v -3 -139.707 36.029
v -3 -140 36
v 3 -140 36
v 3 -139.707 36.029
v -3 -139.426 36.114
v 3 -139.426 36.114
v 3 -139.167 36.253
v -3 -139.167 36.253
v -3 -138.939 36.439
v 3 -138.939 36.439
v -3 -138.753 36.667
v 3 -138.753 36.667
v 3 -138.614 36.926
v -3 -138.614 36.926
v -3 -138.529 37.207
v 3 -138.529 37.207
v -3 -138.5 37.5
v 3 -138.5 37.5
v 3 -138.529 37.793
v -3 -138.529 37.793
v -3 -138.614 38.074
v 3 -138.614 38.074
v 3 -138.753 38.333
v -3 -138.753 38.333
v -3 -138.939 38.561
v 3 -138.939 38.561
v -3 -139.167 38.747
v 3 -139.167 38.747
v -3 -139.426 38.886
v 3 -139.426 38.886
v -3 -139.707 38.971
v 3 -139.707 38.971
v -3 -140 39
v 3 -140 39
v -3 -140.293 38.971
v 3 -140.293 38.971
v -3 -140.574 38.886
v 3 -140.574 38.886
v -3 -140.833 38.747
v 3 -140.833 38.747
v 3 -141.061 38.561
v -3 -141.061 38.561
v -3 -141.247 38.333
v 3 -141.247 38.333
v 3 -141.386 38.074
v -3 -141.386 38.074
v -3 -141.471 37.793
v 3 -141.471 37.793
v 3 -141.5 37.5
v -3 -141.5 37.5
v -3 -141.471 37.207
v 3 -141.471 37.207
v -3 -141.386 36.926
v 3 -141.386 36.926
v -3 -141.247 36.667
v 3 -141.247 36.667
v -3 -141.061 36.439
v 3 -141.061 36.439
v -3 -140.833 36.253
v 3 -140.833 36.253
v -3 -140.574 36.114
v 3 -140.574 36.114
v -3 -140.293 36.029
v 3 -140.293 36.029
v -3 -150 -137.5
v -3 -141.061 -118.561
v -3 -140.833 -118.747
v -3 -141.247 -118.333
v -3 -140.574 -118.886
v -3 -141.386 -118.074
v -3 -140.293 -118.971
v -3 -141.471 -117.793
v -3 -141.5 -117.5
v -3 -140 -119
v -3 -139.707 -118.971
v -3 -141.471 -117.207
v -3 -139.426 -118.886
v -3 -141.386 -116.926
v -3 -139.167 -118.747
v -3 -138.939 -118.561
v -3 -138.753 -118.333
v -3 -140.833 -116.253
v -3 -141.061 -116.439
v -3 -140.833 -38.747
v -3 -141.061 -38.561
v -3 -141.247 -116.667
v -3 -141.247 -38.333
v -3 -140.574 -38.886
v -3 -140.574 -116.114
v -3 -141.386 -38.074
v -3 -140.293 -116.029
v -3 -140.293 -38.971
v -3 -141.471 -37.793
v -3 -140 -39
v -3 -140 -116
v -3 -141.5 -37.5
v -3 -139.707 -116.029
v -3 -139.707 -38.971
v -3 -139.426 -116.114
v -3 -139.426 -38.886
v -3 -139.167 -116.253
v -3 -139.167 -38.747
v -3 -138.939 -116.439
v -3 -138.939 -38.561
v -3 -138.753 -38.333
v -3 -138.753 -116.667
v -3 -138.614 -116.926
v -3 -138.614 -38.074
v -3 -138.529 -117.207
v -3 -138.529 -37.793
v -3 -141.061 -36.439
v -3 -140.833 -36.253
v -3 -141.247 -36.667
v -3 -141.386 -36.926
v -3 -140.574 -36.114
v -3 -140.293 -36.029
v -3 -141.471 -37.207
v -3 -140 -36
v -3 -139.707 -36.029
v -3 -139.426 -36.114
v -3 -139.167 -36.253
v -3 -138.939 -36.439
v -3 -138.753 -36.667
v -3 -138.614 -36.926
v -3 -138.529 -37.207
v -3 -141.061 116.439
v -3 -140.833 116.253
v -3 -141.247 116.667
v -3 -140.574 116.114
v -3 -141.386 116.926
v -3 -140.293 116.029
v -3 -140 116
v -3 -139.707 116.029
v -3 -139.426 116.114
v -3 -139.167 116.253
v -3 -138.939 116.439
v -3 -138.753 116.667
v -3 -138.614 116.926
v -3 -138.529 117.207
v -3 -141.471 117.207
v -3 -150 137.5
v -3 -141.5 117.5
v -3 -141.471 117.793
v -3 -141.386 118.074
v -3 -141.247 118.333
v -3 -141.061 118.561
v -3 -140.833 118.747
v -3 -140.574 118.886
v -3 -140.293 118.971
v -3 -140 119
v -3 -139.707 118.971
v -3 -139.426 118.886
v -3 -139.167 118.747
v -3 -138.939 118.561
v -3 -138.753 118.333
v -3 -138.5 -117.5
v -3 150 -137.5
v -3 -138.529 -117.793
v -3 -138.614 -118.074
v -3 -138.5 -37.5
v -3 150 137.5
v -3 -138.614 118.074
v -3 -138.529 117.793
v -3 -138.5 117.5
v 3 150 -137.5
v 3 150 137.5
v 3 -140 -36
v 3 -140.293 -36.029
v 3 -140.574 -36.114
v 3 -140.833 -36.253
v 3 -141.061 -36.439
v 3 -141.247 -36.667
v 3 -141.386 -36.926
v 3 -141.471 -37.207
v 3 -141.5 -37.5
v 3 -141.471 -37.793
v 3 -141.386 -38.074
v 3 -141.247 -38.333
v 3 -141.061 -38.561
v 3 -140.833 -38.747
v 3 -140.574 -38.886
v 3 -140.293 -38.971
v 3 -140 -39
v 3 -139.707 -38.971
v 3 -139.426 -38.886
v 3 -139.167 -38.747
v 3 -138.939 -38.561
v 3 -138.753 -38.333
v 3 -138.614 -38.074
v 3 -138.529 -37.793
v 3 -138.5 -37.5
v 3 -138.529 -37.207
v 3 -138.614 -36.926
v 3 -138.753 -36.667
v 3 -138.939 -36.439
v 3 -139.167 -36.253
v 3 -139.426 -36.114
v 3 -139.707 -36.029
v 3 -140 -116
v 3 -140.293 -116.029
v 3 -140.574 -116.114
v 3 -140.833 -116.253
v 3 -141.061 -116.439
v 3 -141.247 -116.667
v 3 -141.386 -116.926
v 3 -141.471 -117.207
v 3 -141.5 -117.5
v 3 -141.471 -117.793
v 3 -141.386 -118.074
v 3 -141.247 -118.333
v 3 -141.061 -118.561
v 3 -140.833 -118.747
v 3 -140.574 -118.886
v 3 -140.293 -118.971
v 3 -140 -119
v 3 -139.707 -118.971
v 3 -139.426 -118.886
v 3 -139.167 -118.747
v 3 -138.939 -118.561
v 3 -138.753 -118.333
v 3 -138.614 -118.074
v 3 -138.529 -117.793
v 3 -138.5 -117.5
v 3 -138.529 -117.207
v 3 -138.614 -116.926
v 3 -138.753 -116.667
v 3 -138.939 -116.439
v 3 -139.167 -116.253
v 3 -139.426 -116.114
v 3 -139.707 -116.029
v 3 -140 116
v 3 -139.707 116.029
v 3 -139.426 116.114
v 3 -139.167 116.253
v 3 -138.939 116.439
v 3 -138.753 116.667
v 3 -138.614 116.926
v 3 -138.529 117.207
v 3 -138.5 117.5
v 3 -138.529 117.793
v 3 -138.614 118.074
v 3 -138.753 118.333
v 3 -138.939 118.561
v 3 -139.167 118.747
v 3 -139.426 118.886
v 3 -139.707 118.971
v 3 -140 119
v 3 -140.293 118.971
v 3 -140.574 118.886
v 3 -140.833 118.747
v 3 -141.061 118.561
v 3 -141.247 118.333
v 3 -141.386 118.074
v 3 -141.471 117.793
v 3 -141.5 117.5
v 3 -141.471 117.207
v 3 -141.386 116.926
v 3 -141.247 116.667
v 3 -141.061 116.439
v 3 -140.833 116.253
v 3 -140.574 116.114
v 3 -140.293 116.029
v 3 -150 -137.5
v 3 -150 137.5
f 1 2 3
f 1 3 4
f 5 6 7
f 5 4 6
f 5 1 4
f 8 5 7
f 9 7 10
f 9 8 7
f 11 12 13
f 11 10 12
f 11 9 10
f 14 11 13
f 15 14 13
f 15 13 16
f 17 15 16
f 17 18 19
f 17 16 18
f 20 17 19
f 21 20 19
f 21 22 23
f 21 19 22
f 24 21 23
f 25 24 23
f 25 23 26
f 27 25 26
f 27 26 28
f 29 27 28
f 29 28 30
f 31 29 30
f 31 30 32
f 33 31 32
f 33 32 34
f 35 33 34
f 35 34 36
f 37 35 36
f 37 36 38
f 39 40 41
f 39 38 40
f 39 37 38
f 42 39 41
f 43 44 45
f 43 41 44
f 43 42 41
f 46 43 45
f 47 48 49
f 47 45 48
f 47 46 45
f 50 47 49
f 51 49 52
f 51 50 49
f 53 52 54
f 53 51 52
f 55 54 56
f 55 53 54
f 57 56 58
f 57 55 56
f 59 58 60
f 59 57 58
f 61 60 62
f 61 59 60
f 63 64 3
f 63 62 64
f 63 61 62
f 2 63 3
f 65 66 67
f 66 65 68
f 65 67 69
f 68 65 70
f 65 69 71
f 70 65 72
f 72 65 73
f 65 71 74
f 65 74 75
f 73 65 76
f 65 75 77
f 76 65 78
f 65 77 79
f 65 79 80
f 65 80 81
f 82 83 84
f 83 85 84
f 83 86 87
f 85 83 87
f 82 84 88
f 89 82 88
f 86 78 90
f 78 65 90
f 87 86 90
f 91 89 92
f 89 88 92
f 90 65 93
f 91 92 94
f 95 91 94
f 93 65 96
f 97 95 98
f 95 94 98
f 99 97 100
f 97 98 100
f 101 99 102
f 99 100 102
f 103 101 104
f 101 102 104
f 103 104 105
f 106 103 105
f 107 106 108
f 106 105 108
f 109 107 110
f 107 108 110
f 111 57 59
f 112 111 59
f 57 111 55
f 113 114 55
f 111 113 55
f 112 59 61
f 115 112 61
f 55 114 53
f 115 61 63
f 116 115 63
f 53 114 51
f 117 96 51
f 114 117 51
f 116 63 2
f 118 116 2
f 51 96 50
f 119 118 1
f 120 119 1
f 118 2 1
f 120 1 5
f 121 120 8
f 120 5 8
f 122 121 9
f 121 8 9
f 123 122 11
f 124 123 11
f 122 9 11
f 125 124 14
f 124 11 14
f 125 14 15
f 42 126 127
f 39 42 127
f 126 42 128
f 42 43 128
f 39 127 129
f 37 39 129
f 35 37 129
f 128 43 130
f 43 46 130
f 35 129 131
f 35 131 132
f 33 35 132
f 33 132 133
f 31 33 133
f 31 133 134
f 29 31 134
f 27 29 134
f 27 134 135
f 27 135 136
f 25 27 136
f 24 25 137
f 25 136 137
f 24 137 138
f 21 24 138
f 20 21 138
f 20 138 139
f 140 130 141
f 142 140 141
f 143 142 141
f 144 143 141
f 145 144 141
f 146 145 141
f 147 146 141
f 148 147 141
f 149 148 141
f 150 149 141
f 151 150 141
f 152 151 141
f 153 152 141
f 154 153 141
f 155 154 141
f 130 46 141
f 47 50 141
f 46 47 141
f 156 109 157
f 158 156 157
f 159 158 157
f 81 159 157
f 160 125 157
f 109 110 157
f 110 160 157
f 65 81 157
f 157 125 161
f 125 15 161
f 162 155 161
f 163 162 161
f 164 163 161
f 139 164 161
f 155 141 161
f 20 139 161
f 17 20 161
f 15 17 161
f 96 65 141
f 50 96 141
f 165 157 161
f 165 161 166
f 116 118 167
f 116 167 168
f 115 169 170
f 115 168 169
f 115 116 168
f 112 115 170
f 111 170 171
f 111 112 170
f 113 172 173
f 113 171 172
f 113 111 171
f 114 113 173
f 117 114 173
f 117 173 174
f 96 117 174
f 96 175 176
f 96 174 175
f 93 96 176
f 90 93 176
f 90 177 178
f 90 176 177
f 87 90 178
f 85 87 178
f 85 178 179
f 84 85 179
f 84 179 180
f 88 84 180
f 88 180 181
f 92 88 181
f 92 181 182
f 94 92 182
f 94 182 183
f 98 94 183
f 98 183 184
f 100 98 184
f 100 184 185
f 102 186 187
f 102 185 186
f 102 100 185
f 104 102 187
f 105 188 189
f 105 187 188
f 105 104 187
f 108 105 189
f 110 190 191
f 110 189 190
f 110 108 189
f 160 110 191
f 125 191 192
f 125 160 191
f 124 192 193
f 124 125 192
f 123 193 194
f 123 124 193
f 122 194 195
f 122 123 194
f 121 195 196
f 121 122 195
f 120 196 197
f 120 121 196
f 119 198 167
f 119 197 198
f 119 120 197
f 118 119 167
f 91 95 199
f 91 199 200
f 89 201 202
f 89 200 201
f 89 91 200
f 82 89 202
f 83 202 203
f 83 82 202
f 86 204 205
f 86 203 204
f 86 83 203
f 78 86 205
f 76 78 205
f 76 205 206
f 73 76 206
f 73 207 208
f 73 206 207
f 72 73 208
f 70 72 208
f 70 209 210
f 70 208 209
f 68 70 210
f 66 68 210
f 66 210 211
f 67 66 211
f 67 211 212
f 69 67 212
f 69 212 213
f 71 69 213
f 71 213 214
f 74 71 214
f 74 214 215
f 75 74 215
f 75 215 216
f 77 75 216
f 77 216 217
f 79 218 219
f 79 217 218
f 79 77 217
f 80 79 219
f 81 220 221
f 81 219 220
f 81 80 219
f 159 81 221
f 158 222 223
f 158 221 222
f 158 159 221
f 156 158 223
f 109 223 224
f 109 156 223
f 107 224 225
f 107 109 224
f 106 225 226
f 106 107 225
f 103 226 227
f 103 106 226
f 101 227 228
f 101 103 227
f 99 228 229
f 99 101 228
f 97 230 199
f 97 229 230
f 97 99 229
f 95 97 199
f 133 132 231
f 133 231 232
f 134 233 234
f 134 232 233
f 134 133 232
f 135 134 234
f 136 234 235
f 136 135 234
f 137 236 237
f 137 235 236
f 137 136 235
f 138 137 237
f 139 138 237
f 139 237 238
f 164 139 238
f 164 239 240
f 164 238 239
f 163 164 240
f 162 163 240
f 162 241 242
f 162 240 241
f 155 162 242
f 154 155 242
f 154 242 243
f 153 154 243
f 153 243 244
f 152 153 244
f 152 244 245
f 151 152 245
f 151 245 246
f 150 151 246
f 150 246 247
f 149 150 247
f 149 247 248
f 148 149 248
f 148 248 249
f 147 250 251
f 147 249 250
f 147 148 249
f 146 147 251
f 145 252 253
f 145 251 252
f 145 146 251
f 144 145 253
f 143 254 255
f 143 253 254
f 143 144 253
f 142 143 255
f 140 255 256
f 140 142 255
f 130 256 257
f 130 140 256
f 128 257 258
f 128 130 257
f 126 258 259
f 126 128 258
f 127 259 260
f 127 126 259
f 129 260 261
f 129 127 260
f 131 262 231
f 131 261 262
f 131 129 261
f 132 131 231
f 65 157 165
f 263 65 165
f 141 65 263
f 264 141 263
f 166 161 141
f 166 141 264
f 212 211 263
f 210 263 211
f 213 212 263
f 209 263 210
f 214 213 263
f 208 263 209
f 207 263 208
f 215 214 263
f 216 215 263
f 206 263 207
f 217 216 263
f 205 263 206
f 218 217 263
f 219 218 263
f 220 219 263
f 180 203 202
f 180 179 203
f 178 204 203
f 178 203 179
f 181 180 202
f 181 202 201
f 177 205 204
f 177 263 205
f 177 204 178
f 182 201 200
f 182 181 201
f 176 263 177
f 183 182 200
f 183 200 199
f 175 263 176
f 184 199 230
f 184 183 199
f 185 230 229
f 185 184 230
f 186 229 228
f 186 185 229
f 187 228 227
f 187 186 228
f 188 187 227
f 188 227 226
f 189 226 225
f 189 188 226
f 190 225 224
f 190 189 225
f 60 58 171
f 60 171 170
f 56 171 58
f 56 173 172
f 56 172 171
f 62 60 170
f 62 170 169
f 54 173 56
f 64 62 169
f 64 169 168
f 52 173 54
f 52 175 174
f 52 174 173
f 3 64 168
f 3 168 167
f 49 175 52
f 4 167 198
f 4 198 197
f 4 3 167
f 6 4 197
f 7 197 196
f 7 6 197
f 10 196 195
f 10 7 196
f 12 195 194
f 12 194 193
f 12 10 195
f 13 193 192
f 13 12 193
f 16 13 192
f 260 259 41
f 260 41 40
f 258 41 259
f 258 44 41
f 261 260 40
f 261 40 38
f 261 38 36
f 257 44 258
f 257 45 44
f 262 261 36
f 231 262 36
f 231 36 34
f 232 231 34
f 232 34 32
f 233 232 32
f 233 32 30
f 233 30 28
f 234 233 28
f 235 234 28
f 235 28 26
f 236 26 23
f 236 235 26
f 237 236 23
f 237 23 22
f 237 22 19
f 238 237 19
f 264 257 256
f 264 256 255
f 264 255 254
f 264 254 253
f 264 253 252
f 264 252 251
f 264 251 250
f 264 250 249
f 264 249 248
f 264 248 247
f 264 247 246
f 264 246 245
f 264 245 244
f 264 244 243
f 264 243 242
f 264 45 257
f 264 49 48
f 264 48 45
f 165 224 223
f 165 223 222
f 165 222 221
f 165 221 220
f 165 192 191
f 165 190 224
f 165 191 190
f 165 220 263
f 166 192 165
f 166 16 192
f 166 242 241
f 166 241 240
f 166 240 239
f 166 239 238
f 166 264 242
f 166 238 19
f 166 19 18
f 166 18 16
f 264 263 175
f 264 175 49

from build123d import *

# Parameters (mm, degrees)
SKETCH1_W               = 6
SKETCH1_H               = 300
BOSS_EXTRUDE1_DEPTH     = 137.5
CUT_EXTRUDE1_DEPTH      = 204.507370874
CUT_EXTRUDE1_DEPTH_BACK = 204.507370874
SKETCH2_R               = 1.5


with BuildPart() as part:
    # Sketch1 → Boss-Extrude1 (new, symmetric)
    with BuildSketch(Plane.XY):
        Rectangle(SKETCH1_W, SKETCH1_H)
    extrude(amount=BOSS_EXTRUDE1_DEPTH, both=True)

    # Sketch2 → Cut-Extrude1 (cut, two sides: drawn at the far end of the back side and taken through both)
    with BuildSketch(Plane(origin=(0, 0, 0), x_dir=(0, 0, -1), z_dir=(1, 0, 0)).offset(-CUT_EXTRUDE1_DEPTH_BACK)):
        with Locations((-117.5, -140)):
            Circle(SKETCH2_R)
        with Locations((-37.5, -140)):
            Circle(SKETCH2_R)
        with Locations(Location((37.5, -140, 0), (0, 0, 180))):
            Circle(SKETCH2_R)
        with Locations(Location((117.5, -140, 0), (0, 0, 180))):
            Circle(SKETCH2_R)
    extrude(amount=CUT_EXTRUDE1_DEPTH + CUT_EXTRUDE1_DEPTH_BACK, mode=Mode.SUBTRACT)


solid = part.part
